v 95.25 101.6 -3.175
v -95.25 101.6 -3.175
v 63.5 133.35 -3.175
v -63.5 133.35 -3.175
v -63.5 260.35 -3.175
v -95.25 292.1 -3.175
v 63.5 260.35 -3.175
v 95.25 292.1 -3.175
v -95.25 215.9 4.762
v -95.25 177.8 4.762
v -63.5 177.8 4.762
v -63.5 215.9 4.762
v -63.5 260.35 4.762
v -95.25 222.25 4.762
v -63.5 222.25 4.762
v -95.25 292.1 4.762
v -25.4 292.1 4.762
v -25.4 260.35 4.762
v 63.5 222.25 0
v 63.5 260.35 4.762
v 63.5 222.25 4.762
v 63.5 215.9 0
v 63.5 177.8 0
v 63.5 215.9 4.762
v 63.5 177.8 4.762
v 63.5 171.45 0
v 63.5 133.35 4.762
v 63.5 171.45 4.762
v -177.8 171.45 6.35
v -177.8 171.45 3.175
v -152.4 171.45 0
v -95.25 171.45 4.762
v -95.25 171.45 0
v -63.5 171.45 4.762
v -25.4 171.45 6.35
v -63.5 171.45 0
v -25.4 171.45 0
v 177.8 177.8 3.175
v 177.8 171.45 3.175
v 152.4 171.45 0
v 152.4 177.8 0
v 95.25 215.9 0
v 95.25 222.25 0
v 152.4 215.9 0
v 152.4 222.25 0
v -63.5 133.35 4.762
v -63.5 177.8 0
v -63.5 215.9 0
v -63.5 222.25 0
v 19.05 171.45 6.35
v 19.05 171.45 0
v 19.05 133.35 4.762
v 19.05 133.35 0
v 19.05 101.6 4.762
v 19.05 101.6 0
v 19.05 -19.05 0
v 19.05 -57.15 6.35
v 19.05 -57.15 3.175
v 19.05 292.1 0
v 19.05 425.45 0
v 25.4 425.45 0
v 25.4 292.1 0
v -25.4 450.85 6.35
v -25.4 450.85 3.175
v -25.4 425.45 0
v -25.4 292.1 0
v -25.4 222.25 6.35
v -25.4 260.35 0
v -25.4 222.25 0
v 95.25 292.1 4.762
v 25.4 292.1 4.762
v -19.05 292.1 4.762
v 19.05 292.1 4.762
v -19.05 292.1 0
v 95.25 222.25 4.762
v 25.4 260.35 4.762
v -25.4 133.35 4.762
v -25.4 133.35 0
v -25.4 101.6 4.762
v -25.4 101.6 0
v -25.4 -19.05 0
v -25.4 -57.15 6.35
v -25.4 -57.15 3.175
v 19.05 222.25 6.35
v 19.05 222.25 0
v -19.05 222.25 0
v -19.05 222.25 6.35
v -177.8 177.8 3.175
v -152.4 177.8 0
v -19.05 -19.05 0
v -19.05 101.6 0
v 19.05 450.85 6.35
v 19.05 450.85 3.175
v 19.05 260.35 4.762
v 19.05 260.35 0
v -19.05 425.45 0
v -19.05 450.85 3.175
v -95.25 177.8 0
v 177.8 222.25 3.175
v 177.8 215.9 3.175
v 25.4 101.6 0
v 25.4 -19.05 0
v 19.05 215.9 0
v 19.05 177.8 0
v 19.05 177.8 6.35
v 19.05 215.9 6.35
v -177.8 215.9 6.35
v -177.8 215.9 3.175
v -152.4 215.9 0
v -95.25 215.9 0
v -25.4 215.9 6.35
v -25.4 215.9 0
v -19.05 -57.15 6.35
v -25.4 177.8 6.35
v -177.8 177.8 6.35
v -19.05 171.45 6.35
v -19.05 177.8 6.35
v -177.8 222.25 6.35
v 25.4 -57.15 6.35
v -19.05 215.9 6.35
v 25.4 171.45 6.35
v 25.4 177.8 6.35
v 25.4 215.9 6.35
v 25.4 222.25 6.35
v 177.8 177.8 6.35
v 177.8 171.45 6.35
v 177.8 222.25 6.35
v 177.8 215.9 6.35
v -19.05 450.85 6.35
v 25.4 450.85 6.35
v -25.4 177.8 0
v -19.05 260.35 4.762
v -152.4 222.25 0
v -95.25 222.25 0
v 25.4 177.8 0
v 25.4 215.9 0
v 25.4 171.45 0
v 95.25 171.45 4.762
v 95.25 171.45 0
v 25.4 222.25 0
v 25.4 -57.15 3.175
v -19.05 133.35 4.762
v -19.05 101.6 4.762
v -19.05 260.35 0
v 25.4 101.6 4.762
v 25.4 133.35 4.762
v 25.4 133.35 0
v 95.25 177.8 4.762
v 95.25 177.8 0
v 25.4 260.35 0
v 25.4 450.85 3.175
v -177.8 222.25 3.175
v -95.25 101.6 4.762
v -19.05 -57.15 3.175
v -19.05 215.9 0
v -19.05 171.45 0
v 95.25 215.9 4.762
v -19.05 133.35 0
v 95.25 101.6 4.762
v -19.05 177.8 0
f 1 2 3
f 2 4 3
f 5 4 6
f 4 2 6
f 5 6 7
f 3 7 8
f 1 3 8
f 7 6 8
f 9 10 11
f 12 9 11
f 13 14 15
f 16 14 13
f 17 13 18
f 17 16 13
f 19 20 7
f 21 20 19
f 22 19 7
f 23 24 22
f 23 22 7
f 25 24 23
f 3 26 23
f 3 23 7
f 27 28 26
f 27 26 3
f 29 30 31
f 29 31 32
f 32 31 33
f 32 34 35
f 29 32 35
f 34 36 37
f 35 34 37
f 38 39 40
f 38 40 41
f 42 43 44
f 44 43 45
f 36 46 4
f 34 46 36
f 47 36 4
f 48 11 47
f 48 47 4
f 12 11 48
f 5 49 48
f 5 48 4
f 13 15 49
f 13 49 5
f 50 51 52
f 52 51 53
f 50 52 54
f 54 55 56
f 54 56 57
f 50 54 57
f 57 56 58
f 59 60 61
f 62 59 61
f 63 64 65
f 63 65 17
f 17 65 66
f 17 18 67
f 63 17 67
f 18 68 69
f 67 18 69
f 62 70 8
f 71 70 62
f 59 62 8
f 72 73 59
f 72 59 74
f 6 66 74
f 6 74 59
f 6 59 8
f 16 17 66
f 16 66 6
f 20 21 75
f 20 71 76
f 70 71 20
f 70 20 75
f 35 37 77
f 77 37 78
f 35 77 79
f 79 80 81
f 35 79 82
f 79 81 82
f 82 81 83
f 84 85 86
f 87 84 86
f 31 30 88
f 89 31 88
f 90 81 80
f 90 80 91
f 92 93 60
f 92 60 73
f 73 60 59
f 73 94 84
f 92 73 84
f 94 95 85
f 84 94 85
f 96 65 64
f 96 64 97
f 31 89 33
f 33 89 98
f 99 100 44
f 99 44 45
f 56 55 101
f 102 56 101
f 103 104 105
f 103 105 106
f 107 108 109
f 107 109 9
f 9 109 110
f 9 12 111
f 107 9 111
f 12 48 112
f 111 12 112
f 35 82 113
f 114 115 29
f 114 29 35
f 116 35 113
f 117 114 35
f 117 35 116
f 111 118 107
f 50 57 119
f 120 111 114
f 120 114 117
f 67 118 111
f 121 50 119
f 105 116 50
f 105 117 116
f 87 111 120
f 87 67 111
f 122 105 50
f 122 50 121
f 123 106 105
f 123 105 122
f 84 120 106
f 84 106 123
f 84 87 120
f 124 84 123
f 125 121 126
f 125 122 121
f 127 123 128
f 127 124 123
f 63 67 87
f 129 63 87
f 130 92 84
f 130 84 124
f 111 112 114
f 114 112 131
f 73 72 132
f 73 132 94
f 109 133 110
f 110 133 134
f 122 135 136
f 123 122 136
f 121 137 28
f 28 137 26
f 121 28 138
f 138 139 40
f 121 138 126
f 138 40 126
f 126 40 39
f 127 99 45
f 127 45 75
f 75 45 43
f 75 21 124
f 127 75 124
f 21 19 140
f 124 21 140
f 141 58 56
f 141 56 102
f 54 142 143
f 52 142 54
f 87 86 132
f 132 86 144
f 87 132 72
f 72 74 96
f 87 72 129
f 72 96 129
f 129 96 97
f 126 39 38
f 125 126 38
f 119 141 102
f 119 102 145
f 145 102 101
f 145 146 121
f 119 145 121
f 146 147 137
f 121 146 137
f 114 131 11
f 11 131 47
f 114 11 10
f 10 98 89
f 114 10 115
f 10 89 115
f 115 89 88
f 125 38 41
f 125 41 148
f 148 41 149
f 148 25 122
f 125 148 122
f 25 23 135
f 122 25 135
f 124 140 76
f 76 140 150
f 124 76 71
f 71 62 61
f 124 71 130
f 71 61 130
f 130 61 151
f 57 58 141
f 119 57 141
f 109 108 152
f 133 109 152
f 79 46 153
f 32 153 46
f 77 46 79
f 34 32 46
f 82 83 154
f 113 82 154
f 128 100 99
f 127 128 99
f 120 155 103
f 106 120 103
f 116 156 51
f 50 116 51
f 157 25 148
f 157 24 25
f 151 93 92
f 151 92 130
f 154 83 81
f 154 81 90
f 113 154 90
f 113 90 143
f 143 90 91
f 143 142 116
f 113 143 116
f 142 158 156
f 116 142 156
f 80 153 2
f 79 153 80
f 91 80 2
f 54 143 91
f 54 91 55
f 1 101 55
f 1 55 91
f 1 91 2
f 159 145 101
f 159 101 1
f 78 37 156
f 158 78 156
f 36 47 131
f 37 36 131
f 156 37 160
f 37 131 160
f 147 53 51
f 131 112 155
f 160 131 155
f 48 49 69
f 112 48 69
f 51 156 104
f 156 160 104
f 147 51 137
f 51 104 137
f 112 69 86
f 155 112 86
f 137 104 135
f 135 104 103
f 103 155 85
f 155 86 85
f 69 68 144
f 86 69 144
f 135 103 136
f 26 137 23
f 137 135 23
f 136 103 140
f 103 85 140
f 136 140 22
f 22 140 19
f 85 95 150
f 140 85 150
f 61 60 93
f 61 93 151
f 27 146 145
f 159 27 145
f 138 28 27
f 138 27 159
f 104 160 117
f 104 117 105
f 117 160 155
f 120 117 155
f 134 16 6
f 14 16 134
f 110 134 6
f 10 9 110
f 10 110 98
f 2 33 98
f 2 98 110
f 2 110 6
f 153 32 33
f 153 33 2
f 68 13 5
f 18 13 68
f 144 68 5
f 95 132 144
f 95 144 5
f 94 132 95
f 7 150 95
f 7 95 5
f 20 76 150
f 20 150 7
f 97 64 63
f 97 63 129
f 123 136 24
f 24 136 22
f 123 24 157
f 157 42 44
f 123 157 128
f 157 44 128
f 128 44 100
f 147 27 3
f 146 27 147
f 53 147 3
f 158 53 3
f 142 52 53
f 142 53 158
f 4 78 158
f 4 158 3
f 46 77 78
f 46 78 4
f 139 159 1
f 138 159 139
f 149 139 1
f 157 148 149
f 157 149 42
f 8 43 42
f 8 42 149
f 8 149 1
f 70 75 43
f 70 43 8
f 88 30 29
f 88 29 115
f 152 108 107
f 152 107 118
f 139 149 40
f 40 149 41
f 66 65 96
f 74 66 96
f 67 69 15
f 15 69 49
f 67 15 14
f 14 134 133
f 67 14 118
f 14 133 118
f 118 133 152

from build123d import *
from OCP.BRepFilletAPI import BRepFilletAPI_MakeChamfer

# Parameters (mm, degrees)
SKETCH1_W           = 31.75
SKETCH1_H           = 38.1
SKETCH1_H_2         = 6.35
SKETCH1_W_2         = 6.35
SKETCH1_H_3         = 31.75
SKETCH1_W_3         = 38.1
BOSS_EXTRUDE1_DEPTH = 4.7625
SKETCH1_4_W         = 6.35
SKETCH1_4_H         = 31.75
SKETCH1_4_W_2       = 38.1
SKETCH1_4_W_3       = 31.75
SKETCH1_4_H_2       = 6.35
SKETCH1_4_H_3       = 38.1
BOSS_EXTRUDE2_DEPTH = 3.175
SKETCH1_5_W         = 38.1
SKETCH1_5_H         = 6.35
SKETCH1_5_W_2       = 63.5
SKETCH1_5_W_3       = 6.35
SKETCH1_5_H_2       = 38.1
SKETCH1_5_W_4       = 19.05
SKETCH1_5_H_3       = 139.7
SKETCH1_5_H_4       = 19.05
SKETCH1_5_H_5       = 158.75
SKETCH1_5_H_6       = 31.75
SKETCH1_5_W_5       = 31.75
BOSS_EXTRUDE3_DEPTH = 6.35
CHAMFER1_SIZE       = 25.4
CHAMFER1_SIZE2      = 3.175
CHAMFER2_SIZE       = 3.175
CHAMFER2_SIZE2      = 25.4
CHAMFER3_SIZE       = 38.1
CHAMFER3_SIZE2      = 3.175


with BuildPart() as part:
    # Sketch1 → Boss-Extrude1 (new body)
    with BuildSketch(Plane.XY):
        Polygon((-63.5, 171.45), (-95.25, 171.45), (-95.25, 101.6), (-25.4, 101.6), (-25.4, 133.35), (-63.5, 133.35), align=None)
        with Locations((-79.375, 196.85)):
            Rectangle(SKETCH1_W, SKETCH1_H)
        with Locations((-79.375, 174.625)):
            Rectangle(SKETCH1_W, SKETCH1_H_2)
        with Locations((-79.375, 219.075)):
            Rectangle(SKETCH1_W, SKETCH1_H_2)
        Polygon((-25.4, 260.35), (-25.4, 292.1), (-95.25, 292.1), (-95.25, 222.25), (-63.5, 222.25), (-63.5, 260.35), align=None)
        with Locations((-22.225, 276.225)):
            Rectangle(SKETCH1_W_2, SKETCH1_H_3)
        with Locations((0, 276.225)):
            Rectangle(SKETCH1_W_3, SKETCH1_H_3)
        with Locations((22.225, 276.225)):
            Rectangle(SKETCH1_W_2, SKETCH1_H_3)
        Polygon((95.25, 292.1), (25.4, 292.1), (25.4, 260.35), (63.5, 260.35), (63.5, 222.25), (95.25, 222.25), align=None)
        with Locations((79.375, 219.075)):
            Rectangle(SKETCH1_W, SKETCH1_H_2)
        with Locations((79.375, 196.85)):
            Rectangle(SKETCH1_W, SKETCH1_H)
        with Locations((79.375, 174.625)):
            Rectangle(SKETCH1_W, SKETCH1_H_2)
        Polygon((95.25, 101.6), (95.25, 171.45), (63.5, 171.45), (63.5, 133.35), (25.4, 133.35), (25.4, 101.6), align=None)
        with Locations((22.225, 117.475)):
            Rectangle(SKETCH1_W_2, SKETCH1_H_3)
        with Locations((0, 117.475)):
            Rectangle(SKETCH1_W_3, SKETCH1_H_3)
        with Locations((-22.225, 117.475)):
            Rectangle(SKETCH1_W_2, SKETCH1_H_3)
    extrude(amount=BOSS_EXTRUDE1_DEPTH)

    # Sketch1<4> → Boss-Extrude2 (add)
    with BuildSketch(Plane.XY):
        Polygon((95.25, 292.1), (25.4, 292.1), (25.4, 260.35), (63.5, 260.35), (63.5, 222.25), (95.25, 222.25), align=None)
        with Locations((22.225, 276.225)):
            Rectangle(SKETCH1_4_W, SKETCH1_4_H)
        with Locations((0, 276.225)):
            Rectangle(SKETCH1_4_W_2, SKETCH1_4_H)
        with Locations((-22.225, 276.225)):
            Rectangle(SKETCH1_4_W, SKETCH1_4_H)
        Polygon((-25.4, 260.35), (-25.4, 292.1), (-95.25, 292.1), (-95.25, 222.25), (-63.5, 222.25), (-63.5, 260.35), align=None)
        with Locations((-79.375, 219.075)):
            Rectangle(SKETCH1_4_W_3, SKETCH1_4_H_2)
        with Locations((-79.375, 196.85)):
            Rectangle(SKETCH1_4_W_3, SKETCH1_4_H_3)
        with Locations((-79.375, 174.625)):
            Rectangle(SKETCH1_4_W_3, SKETCH1_4_H_2)
        Polygon((-63.5, 171.45), (-95.25, 171.45), (-95.25, 101.6), (-25.4, 101.6), (-25.4, 133.35), (-63.5, 133.35), align=None)
        with Locations((-22.225, 117.475)):
            Rectangle(SKETCH1_4_W, SKETCH1_4_H)
        with Locations((0, 117.475)):
            Rectangle(SKETCH1_4_W_2, SKETCH1_4_H)
        Polygon((95.25, 101.6), (95.25, 171.45), (63.5, 171.45), (63.5, 133.35), (25.4, 133.35), (25.4, 101.6), align=None)
        with Locations((22.225, 117.475)):
            Rectangle(SKETCH1_4_W, SKETCH1_4_H)
        with Locations((79.375, 174.625)):
            Rectangle(SKETCH1_4_W_3, SKETCH1_4_H_2)
        with Locations((79.375, 196.85)):
            Rectangle(SKETCH1_4_W_3, SKETCH1_4_H_3)
        with Locations((79.375, 219.075)):
            Rectangle(SKETCH1_4_W_3, SKETCH1_4_H_2)
    extrude(amount=-BOSS_EXTRUDE2_DEPTH)

    # Sketch1<5> → Boss-Extrude3 (add)
    with BuildSketch(Plane.XY):
        with Locations((44.45, 219.075)):
            Rectangle(SKETCH1_5_W, SKETCH1_5_H)
        with Locations((127, 219.075)):
            Rectangle(SKETCH1_5_W_2, SKETCH1_5_H)
        with Locations((22.225, 219.075)):
            Rectangle(SKETCH1_5_W_3, SKETCH1_5_H)
        with Locations((0, 219.075)):
            Rectangle(SKETCH1_5_W, SKETCH1_5_H)
        with Locations((-22.225, 219.075)):
            Rectangle(SKETCH1_5_W_3, SKETCH1_5_H)
        with Locations((-44.45, 219.075)):
            Rectangle(SKETCH1_5_W, SKETCH1_5_H)
        with Locations((-22.225, 241.3)):
            Rectangle(SKETCH1_5_W_3, SKETCH1_5_H_2)
        with Locations((22.225, 241.3)):
            Rectangle(SKETCH1_5_W_3, SKETCH1_5_H_2)
        with Locations((22.225, 196.85)):
            Rectangle(SKETCH1_5_W_3, SKETCH1_5_H_2)
        with Locations((-22.225, 196.85)):
            Rectangle(SKETCH1_5_W_3, SKETCH1_5_H_2)
        with Locations((-22.225, 174.625)):
            Rectangle(SKETCH1_5_W_3, SKETCH1_5_H)
        with Locations((0, 174.625)):
            Rectangle(SKETCH1_5_W, SKETCH1_5_H)
        with Locations((22.225, 174.625)):
            Rectangle(SKETCH1_5_W_3, SKETCH1_5_H)
        with Locations((44.45, 174.625)):
            Rectangle(SKETCH1_5_W, SKETCH1_5_H)
        with Locations((22.225, 152.4)):
            Rectangle(SKETCH1_5_W_3, SKETCH1_5_H_2)
        with Locations((-22.225, 152.4)):
            Rectangle(SKETCH1_5_W_3, SKETCH1_5_H_2)
        with Locations((-44.45, 174.625)):
            Rectangle(SKETCH1_5_W, SKETCH1_5_H)
        with Locations((-127, 219.075)):
            Rectangle(SKETCH1_5_W_2, SKETCH1_5_H)
        with Locations((-127, 174.625)):
            Rectangle(SKETCH1_5_W_2, SKETCH1_5_H)
        with Locations((-168.275, 174.625)):
            Rectangle(SKETCH1_5_W_4, SKETCH1_5_H)
        with Locations((-168.275, 219.075)):
            Rectangle(SKETCH1_5_W_4, SKETCH1_5_H)
        with Locations((-22.225, 361.95)):
            Rectangle(SKETCH1_5_W_3, SKETCH1_5_H_3)
        with Locations((22.225, 361.95)):
            Rectangle(SKETCH1_5_W_3, SKETCH1_5_H_3)
        with Locations((22.225, 441.325)):
            Rectangle(SKETCH1_5_W_3, SKETCH1_5_H_4)
        with Locations((-22.225, 441.325)):
            Rectangle(SKETCH1_5_W_3, SKETCH1_5_H_4)
        with Locations((127, 174.625)):
            Rectangle(SKETCH1_5_W_2, SKETCH1_5_H)
        with Locations((168.275, 219.075)):
            Rectangle(SKETCH1_5_W_4, SKETCH1_5_H)
        with Locations((168.275, 174.625)):
            Rectangle(SKETCH1_5_W_4, SKETCH1_5_H)
        with Locations((22.225, 22.225)):
            Rectangle(SKETCH1_5_W_3, SKETCH1_5_H_5)
        with Locations((-22.225, 22.225)):
            Rectangle(SKETCH1_5_W_3, SKETCH1_5_H_5)
        with Locations((-22.225, 117.475)):
            Rectangle(SKETCH1_5_W_3, SKETCH1_5_H_6)
        with Locations((22.225, 117.475)):
            Rectangle(SKETCH1_5_W_3, SKETCH1_5_H_6)
        with Locations((-79.375, 174.625)):
            Rectangle(SKETCH1_5_W_5, SKETCH1_5_H)
        with Locations((-79.375, 219.075)):
            Rectangle(SKETCH1_5_W_5, SKETCH1_5_H)
        with Locations((-22.225, 276.225)):
            Rectangle(SKETCH1_5_W_3, SKETCH1_5_H_6)
        with Locations((22.225, 276.225)):
            Rectangle(SKETCH1_5_W_3, SKETCH1_5_H_6)
        with Locations((79.375, 219.075)):
            Rectangle(SKETCH1_5_W_5, SKETCH1_5_H)
        with Locations((79.375, 174.625)):
            Rectangle(SKETCH1_5_W_5, SKETCH1_5_H)
    extrude(amount=BOSS_EXTRUDE3_DEPTH)

    # Chamfer1: one chamfer whose edges measure the first distance from different faces: ONE call of the kernel's chamfer builder (chamfer() names one face for all edges)
    chamfer1_edges_1 = [part.edges().sort_by_distance(p)[0] for p in [
        (22.225, 450.85, 0),
    ]]
    chamfer1_side_1 = [part.faces().sort_by_distance(p)[0] for p in [
        (22.225, 371.475, 0),
    ]]
    chamfer1_edges_2 = [part.edges().sort_by_distance(p)[0] for p in [
        (-22.225, 450.85, 0),
    ]]
    chamfer1_side_2 = [part.faces().sort_by_distance(p)[0] for p in [
        (-22.225, 371.475, 0),
    ]]
    chamfer1_edges_3 = [part.edges().sort_by_distance(p)[0] for p in [
        (-177.8, 219.075, 0),
    ]]
    chamfer1_side_3 = [part.faces().sort_by_distance(p)[0] for p in [
        (-136.525, 219.075, 0),
    ]]
    chamfer1_edges_4 = [part.edges().sort_by_distance(p)[0] for p in [
        (-177.8, 174.625, 0),
    ]]
    chamfer1_side_4 = [part.faces().sort_by_distance(p)[0] for p in [
        (-136.525, 174.625, 0),
    ]]
    chamfer1 = BRepFilletAPI_MakeChamfer(part.part.solid().wrapped)
    for e in chamfer1_edges_1:
        chamfer1.Add(CHAMFER1_SIZE, CHAMFER1_SIZE2, e.wrapped, chamfer1_side_1[0].wrapped)  # the first distance lies on this face
    for e in chamfer1_edges_2:
        chamfer1.Add(CHAMFER1_SIZE, CHAMFER1_SIZE2, e.wrapped, chamfer1_side_2[0].wrapped)  # the first distance lies on this face
    for e in chamfer1_edges_3:
        chamfer1.Add(CHAMFER1_SIZE, CHAMFER1_SIZE2, e.wrapped, chamfer1_side_3[0].wrapped)  # the first distance lies on this face
    for e in chamfer1_edges_4:
        chamfer1.Add(CHAMFER1_SIZE, CHAMFER1_SIZE2, e.wrapped, chamfer1_side_4[0].wrapped)  # the first distance lies on this face
    add(Compound.cast(chamfer1.Shape()), mode=Mode.REPLACE)

    # Chamfer2: one chamfer whose edges measure the first distance from different faces: ONE call of the kernel's chamfer builder (chamfer() names one face for all edges)
    chamfer2_edges_1 = [part.edges().sort_by_distance(p)[0] for p in [
        (177.8, 219.075, 0),
    ]]
    chamfer2_side_1 = [part.faces().sort_by_distance(p)[0] for p in [
        (177.8, 219.075, 3.175),
    ]]
    chamfer2_edges_2 = [part.edges().sort_by_distance(p)[0] for p in [
        (177.8, 174.625, 0),
    ]]
    chamfer2_side_2 = [part.faces().sort_by_distance(p)[0] for p in [
        (177.8, 174.625, 3.175),
    ]]
    chamfer2 = BRepFilletAPI_MakeChamfer(part.part.solid().wrapped)
    for e in chamfer2_edges_1:
        chamfer2.Add(CHAMFER2_SIZE, CHAMFER2_SIZE2, e.wrapped, chamfer2_side_1[0].wrapped)  # the first distance lies on this face
    for e in chamfer2_edges_2:
        chamfer2.Add(CHAMFER2_SIZE, CHAMFER2_SIZE2, e.wrapped, chamfer2_side_2[0].wrapped)  # the first distance lies on this face
    add(Compound.cast(chamfer2.Shape()), mode=Mode.REPLACE)

    # Chamfer3: one chamfer whose edges measure the first distance from different faces: ONE call of the kernel's chamfer builder (chamfer() names one face for all edges)
    chamfer3_edges_1 = [part.edges().sort_by_distance(p)[0] for p in [
        (-22.225, -57.15, 0),
    ]]
    chamfer3_side_1 = [part.faces().sort_by_distance(p)[0] for p in [
        (-22.225, 22.225, 0),
    ]]
    chamfer3_edges_2 = [part.edges().sort_by_distance(p)[0] for p in [
        (22.225, -57.15, 0),
    ]]
    chamfer3_side_2 = [part.faces().sort_by_distance(p)[0] for p in [
        (22.225, 22.225, 0),
    ]]
    chamfer3 = BRepFilletAPI_MakeChamfer(part.part.solid().wrapped)
    for e in chamfer3_edges_1:
        chamfer3.Add(CHAMFER3_SIZE, CHAMFER3_SIZE2, e.wrapped, chamfer3_side_1[0].wrapped)  # the first distance lies on this face
    for e in chamfer3_edges_2:
        chamfer3.Add(CHAMFER3_SIZE, CHAMFER3_SIZE2, e.wrapped, chamfer3_side_2[0].wrapped)  # the first distance lies on this face
    add(Compound.cast(chamfer3.Shape()), mode=Mode.REPLACE)


solid = part.part
